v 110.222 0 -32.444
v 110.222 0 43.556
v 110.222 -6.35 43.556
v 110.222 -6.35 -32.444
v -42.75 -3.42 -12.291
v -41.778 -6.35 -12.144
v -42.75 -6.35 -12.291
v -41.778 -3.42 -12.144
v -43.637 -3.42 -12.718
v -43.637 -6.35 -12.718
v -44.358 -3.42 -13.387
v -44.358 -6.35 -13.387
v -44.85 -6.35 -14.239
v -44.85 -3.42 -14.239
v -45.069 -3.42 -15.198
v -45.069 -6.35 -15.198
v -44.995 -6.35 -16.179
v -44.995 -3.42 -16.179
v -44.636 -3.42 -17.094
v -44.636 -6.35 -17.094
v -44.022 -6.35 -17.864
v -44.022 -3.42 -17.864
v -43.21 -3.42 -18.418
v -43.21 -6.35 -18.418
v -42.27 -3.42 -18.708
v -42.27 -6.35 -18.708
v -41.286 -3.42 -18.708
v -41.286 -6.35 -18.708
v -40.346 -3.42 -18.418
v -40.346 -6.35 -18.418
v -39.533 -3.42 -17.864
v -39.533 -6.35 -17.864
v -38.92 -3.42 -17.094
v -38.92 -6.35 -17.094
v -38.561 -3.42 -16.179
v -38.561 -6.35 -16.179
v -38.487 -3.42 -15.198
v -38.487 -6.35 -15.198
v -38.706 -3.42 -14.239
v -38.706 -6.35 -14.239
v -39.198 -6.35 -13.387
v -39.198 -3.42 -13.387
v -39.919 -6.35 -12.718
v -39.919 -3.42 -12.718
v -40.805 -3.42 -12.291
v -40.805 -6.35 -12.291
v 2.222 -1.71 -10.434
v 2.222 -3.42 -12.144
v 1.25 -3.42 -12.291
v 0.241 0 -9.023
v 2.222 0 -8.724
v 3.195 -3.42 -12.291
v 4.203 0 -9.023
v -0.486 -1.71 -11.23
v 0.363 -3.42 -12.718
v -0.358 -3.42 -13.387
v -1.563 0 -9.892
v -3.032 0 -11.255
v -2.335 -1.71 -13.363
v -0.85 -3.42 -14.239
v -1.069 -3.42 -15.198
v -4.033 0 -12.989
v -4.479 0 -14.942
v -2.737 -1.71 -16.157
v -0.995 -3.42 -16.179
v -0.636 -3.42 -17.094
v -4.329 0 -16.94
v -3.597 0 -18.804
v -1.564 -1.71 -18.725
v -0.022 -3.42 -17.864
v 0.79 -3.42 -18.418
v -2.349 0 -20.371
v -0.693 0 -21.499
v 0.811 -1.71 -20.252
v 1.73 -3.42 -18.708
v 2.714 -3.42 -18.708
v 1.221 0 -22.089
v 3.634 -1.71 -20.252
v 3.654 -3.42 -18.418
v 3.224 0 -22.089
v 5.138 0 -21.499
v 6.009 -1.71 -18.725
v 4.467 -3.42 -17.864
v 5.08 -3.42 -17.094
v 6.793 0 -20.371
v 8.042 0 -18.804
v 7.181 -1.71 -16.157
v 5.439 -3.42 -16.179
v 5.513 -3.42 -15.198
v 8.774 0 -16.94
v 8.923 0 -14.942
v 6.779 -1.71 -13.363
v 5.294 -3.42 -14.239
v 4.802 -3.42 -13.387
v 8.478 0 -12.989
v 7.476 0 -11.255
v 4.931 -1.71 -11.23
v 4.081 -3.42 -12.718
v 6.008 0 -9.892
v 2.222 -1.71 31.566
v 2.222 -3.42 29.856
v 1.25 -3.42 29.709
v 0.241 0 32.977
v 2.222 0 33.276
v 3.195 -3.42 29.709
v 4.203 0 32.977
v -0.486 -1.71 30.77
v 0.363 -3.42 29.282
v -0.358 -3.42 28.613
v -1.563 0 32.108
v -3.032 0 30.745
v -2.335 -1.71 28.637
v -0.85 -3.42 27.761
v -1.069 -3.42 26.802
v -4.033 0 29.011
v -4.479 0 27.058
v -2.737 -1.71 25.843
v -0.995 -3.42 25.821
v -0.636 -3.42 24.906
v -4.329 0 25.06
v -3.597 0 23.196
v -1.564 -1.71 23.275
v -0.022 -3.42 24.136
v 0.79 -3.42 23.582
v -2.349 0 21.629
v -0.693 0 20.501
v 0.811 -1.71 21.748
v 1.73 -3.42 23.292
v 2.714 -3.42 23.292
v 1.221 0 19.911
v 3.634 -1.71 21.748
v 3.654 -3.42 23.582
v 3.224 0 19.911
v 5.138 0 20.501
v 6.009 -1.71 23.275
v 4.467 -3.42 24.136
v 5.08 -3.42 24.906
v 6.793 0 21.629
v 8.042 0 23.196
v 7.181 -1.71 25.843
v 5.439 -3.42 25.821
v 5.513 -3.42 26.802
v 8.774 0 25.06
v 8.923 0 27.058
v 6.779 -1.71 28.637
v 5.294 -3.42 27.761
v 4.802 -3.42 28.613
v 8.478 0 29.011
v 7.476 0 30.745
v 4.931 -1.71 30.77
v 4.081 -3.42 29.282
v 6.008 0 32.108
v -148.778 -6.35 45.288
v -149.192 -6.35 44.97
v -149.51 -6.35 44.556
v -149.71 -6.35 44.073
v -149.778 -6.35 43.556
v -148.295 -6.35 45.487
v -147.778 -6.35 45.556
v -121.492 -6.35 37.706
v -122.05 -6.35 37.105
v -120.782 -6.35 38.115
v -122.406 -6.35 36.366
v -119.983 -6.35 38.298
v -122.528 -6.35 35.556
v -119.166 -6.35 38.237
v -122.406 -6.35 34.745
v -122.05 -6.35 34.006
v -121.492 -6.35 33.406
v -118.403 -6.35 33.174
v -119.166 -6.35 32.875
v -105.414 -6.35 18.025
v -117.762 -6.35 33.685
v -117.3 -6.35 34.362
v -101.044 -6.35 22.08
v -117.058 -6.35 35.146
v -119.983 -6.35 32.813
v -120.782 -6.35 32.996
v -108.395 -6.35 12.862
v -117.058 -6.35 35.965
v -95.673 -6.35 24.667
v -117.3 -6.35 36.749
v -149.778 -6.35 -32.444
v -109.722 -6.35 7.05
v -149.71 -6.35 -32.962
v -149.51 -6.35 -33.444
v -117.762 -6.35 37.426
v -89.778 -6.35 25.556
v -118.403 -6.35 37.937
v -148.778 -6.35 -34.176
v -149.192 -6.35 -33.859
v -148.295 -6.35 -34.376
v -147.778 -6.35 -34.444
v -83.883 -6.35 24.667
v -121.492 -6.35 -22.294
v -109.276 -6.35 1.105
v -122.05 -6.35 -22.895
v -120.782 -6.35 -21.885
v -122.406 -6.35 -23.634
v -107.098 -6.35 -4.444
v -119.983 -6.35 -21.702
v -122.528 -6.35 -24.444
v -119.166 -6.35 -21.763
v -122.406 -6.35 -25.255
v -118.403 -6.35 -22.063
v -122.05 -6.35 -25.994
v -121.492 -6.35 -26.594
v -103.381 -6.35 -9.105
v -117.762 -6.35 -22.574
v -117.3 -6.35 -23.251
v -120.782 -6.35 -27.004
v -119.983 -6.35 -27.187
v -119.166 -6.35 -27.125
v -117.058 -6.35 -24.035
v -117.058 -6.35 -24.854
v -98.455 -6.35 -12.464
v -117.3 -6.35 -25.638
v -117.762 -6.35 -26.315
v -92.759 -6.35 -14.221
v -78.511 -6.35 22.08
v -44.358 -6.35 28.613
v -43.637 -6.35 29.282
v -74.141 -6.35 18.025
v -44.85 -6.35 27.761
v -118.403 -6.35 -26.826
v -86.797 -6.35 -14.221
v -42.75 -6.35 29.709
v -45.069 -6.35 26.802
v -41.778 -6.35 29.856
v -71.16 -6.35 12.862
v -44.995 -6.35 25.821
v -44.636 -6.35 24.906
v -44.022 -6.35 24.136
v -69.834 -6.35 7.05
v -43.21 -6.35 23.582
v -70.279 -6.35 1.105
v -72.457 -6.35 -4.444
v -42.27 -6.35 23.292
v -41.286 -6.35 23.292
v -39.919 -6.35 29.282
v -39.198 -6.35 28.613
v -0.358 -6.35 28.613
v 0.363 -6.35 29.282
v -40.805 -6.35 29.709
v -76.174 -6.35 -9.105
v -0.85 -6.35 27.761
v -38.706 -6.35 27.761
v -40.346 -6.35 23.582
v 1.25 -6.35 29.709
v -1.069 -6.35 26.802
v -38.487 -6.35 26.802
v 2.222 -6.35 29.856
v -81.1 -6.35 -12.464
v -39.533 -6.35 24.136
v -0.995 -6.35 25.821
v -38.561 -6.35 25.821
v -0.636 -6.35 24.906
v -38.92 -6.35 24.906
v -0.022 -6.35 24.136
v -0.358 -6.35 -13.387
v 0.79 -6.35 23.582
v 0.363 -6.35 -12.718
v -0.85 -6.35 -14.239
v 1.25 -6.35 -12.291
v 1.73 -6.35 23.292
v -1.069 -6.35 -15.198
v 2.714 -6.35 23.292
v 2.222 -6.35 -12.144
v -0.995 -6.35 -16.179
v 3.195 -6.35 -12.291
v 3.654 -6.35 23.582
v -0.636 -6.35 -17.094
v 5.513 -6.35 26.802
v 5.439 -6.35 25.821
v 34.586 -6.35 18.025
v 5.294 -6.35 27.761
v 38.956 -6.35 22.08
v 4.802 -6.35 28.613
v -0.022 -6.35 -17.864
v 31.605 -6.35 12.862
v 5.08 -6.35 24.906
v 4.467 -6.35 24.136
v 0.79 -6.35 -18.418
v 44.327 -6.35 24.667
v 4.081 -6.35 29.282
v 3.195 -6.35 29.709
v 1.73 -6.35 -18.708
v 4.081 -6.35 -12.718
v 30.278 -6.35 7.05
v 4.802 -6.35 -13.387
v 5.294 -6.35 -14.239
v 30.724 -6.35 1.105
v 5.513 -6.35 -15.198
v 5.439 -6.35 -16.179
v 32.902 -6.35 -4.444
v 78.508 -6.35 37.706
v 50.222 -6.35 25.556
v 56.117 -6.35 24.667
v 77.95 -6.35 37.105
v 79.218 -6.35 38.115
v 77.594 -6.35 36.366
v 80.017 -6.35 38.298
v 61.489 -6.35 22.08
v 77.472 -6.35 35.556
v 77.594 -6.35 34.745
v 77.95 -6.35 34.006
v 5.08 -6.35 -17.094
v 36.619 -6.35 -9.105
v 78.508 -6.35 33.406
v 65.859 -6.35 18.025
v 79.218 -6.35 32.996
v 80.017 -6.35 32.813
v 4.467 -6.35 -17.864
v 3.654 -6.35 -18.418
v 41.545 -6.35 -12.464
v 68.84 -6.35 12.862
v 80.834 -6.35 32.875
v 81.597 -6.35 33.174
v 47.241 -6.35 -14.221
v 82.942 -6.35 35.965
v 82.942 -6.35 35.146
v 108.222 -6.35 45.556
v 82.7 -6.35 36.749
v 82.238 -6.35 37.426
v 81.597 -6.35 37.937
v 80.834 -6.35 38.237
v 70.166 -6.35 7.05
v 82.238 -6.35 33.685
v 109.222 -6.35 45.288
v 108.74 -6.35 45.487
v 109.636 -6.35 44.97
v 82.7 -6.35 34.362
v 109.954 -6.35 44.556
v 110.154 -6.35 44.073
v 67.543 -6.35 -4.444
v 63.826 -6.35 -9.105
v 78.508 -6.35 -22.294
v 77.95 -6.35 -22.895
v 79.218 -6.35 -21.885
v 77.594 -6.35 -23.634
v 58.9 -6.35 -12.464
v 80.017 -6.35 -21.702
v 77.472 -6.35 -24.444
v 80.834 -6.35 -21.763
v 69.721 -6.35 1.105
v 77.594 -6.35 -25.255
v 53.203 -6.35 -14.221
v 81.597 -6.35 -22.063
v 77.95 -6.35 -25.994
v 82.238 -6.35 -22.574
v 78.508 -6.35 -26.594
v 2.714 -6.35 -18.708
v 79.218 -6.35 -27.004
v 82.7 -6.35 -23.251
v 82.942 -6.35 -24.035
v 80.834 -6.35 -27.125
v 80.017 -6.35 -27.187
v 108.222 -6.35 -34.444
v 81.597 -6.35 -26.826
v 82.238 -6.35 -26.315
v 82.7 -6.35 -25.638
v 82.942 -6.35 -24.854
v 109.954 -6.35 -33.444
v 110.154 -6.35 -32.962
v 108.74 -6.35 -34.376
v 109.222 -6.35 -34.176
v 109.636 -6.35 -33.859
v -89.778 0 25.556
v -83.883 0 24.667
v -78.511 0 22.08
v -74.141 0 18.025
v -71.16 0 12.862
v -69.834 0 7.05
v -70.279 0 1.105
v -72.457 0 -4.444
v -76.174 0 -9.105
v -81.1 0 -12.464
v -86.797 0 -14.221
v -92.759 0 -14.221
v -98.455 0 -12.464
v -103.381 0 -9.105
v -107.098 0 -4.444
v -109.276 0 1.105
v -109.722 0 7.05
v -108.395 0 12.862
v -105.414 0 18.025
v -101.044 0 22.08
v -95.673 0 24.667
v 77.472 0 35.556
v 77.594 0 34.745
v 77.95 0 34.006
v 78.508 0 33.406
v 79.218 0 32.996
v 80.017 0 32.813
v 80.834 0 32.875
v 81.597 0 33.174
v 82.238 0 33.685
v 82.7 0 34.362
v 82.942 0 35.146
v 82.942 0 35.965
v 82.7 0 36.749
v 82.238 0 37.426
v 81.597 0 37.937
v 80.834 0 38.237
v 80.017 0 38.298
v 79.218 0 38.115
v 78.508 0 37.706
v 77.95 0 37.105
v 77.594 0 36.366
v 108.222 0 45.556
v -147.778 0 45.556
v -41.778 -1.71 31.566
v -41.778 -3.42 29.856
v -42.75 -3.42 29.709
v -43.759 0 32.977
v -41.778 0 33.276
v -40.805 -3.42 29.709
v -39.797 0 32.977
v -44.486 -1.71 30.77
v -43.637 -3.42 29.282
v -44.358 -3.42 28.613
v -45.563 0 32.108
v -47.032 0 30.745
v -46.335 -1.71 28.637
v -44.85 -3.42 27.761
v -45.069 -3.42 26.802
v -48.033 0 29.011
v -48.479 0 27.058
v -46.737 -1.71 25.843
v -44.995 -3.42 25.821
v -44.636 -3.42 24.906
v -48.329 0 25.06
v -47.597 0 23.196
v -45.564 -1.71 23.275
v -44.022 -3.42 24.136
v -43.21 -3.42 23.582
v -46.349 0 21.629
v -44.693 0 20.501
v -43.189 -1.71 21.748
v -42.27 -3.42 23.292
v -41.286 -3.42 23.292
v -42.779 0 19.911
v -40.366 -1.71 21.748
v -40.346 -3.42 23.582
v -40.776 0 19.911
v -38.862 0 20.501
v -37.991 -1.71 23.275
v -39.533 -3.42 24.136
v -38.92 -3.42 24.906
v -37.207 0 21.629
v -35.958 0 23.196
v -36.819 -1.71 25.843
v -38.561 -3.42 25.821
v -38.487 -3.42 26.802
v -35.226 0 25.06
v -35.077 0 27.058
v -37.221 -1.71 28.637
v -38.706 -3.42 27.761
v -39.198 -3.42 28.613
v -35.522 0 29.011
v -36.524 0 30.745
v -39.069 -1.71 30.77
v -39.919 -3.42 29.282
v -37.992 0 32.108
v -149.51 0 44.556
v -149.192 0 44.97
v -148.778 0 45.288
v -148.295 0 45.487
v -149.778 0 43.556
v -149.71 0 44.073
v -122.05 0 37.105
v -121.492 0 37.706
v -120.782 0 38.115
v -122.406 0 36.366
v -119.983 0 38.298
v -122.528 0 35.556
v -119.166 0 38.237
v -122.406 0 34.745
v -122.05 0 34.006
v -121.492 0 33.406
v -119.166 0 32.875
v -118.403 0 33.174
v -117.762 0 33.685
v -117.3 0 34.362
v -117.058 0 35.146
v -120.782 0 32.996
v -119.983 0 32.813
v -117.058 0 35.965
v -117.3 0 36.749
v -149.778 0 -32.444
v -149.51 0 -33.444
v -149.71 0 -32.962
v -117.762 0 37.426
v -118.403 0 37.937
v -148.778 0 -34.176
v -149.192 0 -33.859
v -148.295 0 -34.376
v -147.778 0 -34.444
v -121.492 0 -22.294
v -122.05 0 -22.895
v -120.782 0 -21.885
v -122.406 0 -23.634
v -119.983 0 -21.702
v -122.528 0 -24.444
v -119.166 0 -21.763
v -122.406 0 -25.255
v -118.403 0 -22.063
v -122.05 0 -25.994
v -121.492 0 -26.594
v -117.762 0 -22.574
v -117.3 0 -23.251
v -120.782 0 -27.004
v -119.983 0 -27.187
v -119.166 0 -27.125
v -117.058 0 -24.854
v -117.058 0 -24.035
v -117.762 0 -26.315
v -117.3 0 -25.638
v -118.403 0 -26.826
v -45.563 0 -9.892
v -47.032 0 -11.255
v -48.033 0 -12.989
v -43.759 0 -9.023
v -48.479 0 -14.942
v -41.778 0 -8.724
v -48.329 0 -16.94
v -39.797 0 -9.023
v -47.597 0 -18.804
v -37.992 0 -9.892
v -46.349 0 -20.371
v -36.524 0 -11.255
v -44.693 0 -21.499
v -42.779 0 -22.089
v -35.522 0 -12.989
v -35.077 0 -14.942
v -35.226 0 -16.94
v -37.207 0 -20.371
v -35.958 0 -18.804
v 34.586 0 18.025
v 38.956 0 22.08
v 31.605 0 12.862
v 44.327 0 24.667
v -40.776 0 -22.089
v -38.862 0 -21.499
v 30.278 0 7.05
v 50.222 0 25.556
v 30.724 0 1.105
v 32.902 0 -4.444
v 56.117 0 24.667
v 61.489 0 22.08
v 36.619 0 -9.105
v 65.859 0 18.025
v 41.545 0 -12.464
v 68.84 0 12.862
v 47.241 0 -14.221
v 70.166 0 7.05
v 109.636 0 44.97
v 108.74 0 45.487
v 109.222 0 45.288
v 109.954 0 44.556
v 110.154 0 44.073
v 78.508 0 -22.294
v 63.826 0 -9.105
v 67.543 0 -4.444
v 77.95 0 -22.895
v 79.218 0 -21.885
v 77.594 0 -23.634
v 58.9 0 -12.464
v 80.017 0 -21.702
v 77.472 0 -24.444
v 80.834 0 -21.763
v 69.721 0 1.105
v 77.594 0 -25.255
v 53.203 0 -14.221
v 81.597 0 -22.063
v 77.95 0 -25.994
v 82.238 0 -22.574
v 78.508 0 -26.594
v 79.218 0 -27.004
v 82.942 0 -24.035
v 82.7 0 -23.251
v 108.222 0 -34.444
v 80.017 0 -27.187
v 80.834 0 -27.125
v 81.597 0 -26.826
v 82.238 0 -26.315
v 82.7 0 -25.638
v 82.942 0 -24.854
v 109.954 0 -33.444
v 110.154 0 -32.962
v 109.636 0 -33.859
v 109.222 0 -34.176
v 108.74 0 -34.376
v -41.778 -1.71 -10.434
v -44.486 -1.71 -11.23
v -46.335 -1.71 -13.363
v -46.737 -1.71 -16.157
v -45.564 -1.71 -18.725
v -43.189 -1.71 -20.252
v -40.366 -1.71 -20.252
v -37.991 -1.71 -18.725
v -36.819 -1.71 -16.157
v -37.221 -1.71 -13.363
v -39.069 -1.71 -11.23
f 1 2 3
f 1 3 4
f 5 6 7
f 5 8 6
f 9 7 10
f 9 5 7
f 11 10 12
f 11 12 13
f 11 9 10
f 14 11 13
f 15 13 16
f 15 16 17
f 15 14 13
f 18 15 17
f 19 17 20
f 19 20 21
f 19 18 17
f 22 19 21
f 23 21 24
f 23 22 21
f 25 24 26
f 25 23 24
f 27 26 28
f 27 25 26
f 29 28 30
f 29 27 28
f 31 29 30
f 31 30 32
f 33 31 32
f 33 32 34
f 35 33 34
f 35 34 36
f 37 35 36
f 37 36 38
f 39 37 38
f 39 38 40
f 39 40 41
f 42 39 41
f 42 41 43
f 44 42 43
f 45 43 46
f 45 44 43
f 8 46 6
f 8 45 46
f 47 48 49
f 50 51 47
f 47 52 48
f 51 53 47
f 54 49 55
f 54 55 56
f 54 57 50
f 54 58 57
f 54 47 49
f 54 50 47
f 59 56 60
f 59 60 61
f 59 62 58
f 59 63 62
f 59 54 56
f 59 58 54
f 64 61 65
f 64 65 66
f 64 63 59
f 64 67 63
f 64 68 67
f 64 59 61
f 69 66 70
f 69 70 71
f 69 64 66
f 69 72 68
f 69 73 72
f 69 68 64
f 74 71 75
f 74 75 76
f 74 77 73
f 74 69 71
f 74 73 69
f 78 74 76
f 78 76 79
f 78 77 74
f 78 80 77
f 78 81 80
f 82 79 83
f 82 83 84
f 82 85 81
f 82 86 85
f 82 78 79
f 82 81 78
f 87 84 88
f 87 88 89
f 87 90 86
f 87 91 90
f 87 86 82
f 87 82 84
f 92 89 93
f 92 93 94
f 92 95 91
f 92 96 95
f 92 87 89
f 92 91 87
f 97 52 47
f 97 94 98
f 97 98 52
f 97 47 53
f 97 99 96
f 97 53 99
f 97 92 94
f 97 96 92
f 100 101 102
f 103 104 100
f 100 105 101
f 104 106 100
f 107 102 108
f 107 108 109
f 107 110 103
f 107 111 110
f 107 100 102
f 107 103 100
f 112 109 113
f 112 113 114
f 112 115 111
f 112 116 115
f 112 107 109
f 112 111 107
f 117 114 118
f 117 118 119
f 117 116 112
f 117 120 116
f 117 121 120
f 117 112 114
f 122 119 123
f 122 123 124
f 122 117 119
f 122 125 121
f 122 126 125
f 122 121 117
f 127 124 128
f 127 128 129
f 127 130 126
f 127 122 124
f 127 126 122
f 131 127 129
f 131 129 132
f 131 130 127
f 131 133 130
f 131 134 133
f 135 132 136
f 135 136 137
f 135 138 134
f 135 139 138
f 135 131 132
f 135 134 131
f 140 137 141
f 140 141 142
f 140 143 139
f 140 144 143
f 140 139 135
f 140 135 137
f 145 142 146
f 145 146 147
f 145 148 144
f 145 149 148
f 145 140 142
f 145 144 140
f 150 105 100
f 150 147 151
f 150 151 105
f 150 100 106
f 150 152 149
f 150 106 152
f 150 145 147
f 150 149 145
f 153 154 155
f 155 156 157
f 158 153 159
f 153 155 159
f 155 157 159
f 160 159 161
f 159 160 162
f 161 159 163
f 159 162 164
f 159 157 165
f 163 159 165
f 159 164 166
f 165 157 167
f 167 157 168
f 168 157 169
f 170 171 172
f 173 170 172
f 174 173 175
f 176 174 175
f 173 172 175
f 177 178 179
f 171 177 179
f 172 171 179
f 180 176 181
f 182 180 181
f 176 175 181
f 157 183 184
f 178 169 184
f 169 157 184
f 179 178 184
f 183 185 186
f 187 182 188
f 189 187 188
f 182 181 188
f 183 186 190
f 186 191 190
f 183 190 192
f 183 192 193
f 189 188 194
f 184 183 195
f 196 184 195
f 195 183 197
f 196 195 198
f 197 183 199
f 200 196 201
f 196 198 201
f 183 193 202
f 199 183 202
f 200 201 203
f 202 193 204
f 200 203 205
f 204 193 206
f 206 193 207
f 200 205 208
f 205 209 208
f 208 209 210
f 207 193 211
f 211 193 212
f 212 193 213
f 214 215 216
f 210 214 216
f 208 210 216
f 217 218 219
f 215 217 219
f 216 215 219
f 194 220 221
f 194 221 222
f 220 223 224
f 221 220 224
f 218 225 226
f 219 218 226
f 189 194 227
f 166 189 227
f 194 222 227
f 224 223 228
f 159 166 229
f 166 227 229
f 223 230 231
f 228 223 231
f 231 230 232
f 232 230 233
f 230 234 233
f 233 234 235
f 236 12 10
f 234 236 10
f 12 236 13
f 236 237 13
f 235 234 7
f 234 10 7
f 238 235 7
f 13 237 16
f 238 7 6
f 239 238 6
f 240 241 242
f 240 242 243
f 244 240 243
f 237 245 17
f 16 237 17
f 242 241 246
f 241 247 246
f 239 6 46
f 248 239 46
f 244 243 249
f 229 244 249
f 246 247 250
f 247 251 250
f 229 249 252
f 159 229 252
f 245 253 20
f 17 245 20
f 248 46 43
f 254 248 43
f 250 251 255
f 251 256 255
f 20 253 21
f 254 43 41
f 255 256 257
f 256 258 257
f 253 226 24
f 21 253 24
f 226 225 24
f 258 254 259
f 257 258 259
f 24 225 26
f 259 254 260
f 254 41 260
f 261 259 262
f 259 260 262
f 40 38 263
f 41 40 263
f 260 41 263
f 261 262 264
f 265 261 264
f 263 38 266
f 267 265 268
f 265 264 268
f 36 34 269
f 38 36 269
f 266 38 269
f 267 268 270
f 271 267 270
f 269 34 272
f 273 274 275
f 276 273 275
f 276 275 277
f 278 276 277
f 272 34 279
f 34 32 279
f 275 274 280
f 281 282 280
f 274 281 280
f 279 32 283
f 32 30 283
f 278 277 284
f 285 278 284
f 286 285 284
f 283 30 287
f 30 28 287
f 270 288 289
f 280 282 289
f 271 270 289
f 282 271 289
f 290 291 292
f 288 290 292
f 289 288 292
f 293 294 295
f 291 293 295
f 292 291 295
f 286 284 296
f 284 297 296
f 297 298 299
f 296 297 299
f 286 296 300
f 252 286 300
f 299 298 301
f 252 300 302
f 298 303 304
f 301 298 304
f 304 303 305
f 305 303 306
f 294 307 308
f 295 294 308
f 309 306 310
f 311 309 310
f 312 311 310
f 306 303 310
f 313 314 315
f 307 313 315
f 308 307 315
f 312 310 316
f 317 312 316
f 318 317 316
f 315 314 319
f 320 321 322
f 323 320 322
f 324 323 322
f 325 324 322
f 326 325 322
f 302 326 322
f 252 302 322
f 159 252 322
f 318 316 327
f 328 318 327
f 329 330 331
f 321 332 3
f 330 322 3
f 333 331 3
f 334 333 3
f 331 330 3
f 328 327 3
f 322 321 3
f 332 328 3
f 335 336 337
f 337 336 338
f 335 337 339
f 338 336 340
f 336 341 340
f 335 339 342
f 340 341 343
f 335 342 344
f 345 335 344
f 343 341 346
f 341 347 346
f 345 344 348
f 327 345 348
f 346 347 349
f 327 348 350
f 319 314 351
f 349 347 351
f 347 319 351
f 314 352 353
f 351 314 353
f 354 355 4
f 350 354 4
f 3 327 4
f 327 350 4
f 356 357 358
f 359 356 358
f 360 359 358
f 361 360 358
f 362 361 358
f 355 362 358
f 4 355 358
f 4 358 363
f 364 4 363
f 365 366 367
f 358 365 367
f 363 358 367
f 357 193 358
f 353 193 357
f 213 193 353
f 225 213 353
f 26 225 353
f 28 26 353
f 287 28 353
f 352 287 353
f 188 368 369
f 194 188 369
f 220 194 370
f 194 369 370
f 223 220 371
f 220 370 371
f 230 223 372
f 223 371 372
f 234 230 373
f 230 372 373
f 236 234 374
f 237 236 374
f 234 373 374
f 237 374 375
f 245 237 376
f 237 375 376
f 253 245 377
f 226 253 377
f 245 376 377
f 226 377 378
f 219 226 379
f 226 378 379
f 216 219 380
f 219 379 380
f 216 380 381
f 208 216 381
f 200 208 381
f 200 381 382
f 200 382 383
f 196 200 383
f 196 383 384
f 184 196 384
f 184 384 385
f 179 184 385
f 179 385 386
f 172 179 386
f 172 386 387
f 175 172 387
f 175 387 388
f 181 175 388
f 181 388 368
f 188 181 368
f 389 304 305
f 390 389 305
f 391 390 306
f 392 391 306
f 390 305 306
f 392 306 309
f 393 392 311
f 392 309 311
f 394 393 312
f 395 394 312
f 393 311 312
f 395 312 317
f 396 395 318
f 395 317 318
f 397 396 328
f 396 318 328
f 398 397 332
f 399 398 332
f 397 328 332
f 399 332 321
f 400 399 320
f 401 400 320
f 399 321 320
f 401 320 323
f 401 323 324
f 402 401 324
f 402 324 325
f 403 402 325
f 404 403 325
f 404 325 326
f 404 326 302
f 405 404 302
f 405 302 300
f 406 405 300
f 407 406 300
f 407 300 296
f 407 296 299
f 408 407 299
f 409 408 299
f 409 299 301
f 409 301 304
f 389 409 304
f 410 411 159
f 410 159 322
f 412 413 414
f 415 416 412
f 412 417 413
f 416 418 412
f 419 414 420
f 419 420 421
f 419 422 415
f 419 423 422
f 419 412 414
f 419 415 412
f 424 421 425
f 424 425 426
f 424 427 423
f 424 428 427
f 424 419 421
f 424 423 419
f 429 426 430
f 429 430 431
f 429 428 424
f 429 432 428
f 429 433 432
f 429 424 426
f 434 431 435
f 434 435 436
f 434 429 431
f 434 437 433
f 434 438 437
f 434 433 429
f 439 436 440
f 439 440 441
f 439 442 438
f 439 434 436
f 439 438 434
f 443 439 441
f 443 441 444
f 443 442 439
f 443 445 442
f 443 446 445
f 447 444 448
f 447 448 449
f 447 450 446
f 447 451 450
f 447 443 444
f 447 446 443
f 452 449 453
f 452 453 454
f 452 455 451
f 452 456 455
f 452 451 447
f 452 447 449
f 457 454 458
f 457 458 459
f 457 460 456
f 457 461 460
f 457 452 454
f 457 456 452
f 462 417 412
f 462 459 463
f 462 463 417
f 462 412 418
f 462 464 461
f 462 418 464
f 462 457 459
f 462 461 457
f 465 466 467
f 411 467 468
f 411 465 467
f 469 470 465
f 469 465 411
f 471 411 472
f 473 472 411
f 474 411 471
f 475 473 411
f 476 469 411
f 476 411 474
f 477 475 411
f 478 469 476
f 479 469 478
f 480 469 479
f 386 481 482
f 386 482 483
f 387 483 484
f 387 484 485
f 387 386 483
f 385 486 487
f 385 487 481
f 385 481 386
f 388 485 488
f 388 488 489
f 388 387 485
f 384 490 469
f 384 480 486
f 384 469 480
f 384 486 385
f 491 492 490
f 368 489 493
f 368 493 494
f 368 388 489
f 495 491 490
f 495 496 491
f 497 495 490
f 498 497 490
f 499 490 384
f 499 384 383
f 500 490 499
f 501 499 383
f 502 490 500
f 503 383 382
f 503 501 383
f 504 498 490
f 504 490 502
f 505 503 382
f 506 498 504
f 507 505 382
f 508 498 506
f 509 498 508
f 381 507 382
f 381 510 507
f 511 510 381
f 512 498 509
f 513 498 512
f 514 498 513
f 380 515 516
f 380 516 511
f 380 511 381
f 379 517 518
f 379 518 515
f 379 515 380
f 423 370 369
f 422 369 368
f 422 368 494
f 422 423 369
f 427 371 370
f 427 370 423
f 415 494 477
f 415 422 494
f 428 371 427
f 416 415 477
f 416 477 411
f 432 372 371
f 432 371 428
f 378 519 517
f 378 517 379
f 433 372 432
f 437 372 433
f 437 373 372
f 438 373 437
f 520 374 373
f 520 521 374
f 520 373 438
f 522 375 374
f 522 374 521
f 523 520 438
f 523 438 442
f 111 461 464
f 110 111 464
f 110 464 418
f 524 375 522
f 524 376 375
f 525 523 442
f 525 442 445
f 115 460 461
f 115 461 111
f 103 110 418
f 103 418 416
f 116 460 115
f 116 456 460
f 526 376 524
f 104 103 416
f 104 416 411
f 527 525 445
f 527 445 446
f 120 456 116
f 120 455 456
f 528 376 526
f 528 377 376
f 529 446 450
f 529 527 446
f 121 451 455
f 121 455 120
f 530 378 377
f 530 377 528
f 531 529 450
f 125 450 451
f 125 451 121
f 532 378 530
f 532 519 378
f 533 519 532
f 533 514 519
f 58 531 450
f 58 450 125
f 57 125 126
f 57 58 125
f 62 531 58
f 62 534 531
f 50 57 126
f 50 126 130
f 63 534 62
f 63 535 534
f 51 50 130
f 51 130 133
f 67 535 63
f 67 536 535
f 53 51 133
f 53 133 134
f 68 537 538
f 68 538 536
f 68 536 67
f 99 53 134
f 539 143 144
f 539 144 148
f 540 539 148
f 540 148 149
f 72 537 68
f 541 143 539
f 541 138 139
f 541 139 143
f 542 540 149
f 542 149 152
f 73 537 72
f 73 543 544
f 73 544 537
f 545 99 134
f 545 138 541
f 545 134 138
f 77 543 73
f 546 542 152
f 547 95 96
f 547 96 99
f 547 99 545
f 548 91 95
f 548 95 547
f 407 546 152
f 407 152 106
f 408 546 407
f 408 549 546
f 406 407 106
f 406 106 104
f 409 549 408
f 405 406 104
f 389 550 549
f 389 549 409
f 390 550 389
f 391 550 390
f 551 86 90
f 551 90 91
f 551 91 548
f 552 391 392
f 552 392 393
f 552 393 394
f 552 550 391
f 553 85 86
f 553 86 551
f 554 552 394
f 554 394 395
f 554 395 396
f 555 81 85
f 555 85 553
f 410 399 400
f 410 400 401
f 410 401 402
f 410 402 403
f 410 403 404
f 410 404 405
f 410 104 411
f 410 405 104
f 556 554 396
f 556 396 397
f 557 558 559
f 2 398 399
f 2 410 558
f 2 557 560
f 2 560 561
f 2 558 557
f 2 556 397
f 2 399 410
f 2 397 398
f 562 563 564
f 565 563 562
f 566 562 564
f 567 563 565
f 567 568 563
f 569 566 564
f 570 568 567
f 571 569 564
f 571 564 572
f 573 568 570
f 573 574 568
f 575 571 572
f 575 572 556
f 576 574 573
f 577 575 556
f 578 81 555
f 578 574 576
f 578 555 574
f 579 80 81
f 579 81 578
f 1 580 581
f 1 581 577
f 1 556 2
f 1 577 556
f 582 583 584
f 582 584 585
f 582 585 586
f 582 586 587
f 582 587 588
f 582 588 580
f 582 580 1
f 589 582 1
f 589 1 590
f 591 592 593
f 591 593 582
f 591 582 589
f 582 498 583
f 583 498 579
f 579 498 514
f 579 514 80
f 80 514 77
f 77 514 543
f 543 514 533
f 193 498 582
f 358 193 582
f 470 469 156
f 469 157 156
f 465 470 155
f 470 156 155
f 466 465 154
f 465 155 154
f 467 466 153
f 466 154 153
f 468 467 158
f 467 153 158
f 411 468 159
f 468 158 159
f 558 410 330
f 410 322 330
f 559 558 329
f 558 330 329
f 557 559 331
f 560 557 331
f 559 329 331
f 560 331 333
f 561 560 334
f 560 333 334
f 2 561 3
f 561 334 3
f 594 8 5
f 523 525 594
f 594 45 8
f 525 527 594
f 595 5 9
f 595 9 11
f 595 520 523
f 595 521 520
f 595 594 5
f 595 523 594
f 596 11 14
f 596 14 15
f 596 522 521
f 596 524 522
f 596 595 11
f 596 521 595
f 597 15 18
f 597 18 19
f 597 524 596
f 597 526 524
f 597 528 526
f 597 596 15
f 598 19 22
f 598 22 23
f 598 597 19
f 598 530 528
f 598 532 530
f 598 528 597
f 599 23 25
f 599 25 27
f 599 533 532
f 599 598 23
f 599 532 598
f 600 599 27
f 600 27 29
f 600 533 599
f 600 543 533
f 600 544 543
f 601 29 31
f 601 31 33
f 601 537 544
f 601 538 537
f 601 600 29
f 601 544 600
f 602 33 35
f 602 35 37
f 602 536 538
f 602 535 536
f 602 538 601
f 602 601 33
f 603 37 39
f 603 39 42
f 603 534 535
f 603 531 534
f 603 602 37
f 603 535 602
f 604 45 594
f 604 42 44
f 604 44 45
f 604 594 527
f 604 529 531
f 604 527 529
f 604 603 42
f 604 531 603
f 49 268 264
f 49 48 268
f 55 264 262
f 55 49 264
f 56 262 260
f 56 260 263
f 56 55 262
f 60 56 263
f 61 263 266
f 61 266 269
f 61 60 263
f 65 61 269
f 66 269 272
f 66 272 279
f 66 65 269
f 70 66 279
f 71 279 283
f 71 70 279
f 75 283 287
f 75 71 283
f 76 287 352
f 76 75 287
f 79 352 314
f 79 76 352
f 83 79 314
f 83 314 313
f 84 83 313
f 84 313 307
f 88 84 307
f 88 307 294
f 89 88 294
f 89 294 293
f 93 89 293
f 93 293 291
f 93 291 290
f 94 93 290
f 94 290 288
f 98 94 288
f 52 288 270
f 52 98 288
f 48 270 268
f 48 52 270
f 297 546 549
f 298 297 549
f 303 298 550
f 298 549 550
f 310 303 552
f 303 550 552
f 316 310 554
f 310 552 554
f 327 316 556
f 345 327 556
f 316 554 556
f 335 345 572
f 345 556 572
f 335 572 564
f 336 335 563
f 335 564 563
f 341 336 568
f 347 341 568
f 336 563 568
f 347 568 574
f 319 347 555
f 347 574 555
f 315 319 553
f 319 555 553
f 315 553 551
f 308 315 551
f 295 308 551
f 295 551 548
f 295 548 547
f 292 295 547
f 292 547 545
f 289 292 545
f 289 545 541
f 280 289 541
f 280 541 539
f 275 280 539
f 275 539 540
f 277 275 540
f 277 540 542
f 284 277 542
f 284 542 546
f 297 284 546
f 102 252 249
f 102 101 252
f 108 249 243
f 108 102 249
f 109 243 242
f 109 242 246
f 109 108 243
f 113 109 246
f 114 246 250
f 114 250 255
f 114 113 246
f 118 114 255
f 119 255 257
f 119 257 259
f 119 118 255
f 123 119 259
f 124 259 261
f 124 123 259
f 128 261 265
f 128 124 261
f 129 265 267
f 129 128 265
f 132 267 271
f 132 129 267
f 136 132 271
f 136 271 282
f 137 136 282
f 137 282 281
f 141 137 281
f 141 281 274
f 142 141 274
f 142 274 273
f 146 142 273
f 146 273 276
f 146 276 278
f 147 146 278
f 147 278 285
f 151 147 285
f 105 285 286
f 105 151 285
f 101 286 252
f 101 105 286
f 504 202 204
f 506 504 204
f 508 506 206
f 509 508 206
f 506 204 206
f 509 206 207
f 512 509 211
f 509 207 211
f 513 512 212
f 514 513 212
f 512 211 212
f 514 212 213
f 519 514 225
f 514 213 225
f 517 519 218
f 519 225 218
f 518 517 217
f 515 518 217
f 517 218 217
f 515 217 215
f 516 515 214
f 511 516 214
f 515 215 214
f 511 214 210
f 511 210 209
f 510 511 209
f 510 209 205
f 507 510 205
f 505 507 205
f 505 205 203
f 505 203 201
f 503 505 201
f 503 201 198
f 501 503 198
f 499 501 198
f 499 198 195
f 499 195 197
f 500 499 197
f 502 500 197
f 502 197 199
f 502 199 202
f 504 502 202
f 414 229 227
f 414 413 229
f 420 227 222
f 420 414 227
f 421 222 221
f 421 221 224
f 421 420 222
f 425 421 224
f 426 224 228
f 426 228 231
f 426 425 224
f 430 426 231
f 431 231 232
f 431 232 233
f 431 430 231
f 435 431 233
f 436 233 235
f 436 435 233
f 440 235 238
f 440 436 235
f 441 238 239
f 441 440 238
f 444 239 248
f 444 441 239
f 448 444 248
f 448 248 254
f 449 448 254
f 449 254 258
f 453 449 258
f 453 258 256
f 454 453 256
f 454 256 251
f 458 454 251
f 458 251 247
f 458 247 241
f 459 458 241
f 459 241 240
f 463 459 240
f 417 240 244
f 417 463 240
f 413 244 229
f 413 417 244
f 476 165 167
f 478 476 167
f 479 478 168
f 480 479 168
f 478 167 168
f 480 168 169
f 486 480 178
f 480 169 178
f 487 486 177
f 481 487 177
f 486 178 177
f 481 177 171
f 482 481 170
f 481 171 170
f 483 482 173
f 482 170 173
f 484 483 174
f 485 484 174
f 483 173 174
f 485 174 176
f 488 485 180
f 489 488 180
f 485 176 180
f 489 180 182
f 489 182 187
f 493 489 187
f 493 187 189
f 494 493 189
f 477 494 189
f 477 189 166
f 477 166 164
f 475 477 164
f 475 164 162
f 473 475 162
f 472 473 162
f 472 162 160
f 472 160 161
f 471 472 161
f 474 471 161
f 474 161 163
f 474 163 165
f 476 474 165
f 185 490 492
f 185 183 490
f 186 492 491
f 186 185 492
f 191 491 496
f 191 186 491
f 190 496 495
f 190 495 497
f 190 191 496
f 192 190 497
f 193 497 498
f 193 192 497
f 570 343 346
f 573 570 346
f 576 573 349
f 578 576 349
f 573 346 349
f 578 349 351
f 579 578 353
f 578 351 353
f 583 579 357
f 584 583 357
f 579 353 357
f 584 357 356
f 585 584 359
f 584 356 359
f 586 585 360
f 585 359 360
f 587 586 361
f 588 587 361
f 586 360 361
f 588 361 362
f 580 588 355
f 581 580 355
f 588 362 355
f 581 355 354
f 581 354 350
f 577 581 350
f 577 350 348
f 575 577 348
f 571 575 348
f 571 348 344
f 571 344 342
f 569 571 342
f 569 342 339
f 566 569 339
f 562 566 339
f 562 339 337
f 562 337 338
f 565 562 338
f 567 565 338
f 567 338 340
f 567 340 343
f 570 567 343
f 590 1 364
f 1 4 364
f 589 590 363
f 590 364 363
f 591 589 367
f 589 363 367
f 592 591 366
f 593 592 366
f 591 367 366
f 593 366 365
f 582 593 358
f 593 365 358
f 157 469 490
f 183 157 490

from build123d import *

# Parameters (mm, degrees)
CROQUIS1_W                                   = 260
CROQUIS1_H                                   = 80
BRIDA_BASE1_DEPTH                            = 6.35
REDONDEO1_R                                  = 2
TALADRO_DE_MARGEN_PARA_M51_D                 = 5.5
REFRENTADO_PARA_TORNILLO_TAP_N_CON_C_2_COUNT = 2
REFRENTADO_PARA_TORNILLO_TAP_N_CON_C_2_PITCH = 44
REFRENTADO_PARA_TORNILLO_TAP_N_CON_C_3_COUNT = 2
REFRENTADO_PARA_TORNILLO_TAP_N_CON_C_3_PITCH = 60.827625303
REFRENTADO_PARA_TORNILLO_TAP_N_CON_C_4_COUNT = 2
REFRENTADO_PARA_TORNILLO_TAP_N_CON_C_4_PITCH = 42
CROQUIS11_R                                  = 20
CORTAR_EXTRUIR1_DEPTH                        = 10


# Sheet-metal steps are written as plain solids
with BuildPart() as part:
    # Croquis1 → Brida base1 (new body)
    with BuildSketch(Plane(origin=(0, 0, 0), x_dir=(1, 0, 0), z_dir=(0, 1, 0))):
        with Locations((-19.777777778, -5.555555556)):
            Rectangle(CROQUIS1_W, CROQUIS1_H)
    extrude(amount=-BRIDA_BASE1_DEPTH)

    # Redondeo1
    redondeo1_edges = [part.edges().sort_by_distance(p)[0] for p in [
        (-149.777777778, -3.175, -34.444444444),
        (110.222222222, -3.175, -34.444444444),
        (110.222222222, -3.175, 45.555555556),
        (-149.777777778, -3.175, 45.555555556),
    ]]
    fillet(redondeo1_edges, radius=REDONDEO1_R)

    # Taladro de margen para M51 (through all)
    with Locations(Plane(origin=(0, 0, 0), x_dir=(1, 0, 0), z_dir=(0, 1, 0))):
        with Locations((-119.777777778, 24.444444444), (-119.777777778, -35.555555556), (80.222222222, -35.555555556), (80.222222222, 24.444444444)):
            Hole(TALADRO_DE_MARGEN_PARA_M51_D / 2)

    # Croquis9 → Refrentado para tornillo tapón con cabeza plana de clavija de M61 (revolve, cut)
    with BuildSketch(Plane(origin=(-41.777777778, 0, -15.444444444), x_dir=(0, 0, 1), z_dir=(1, 0, 0))):
        Polygon((0, 0), (0, 6.35), (3.3, 6.35), (3.3, 3.42), (6.72, 0), align=None)
    refrentado_para_tornillo_tap_n_con_cabez = revolve(axis=Axis((-41.777777778, 6.35, -15.444444444), (0, -1, 0)), mode=Mode.SUBTRACT)

    # Refrentado para tornillo tap_n con c 2: Refrentado para tornillo tapón con cabeza plana de clavija de M61 ×2
    with Locations(*[(i * REFRENTADO_PARA_TORNILLO_TAP_N_CON_C_2_PITCH, 0, 0) for i in range(1, REFRENTADO_PARA_TORNILLO_TAP_N_CON_C_2_COUNT)]):
        add(refrentado_para_tornillo_tap_n_con_cabez, mode=Mode.SUBTRACT)

    # Refrentado para tornillo tap_n con c 3: Refrentado para tornillo tapón con cabeza plana de clavija de M61 ×2
    with Locations(*[Vector(0.7233555441435721, 0, 0.6904757466825007) * (i * REFRENTADO_PARA_TORNILLO_TAP_N_CON_C_3_PITCH) for i in range(1, REFRENTADO_PARA_TORNILLO_TAP_N_CON_C_3_COUNT)]):
        add(refrentado_para_tornillo_tap_n_con_cabez, mode=Mode.SUBTRACT)

    # Refrentado para tornillo tap_n con c 4: Refrentado para tornillo tapón con cabeza plana de clavija de M61 ×2
    with Locations(*[(0, 0, i * REFRENTADO_PARA_TORNILLO_TAP_N_CON_C_4_PITCH) for i in range(1, REFRENTADO_PARA_TORNILLO_TAP_N_CON_C_4_COUNT)]):
        add(refrentado_para_tornillo_tap_n_con_cabez, mode=Mode.SUBTRACT)

    # Croquis11 → Cortar-Extruir1 (cut)
    with BuildSketch(Plane(origin=(0, 0, 0), x_dir=(1, 0, 0), z_dir=(0, 1, 0))):
        with Locations(Location((-89.777777778, -5.555555556, 0), (0, 0, 270))):
            Circle(CROQUIS11_R)
        with Locations(Location((50.222222222, -5.555555556, 0), (0, 0, 270))):
            Circle(CROQUIS11_R)
    extrude(amount=-CORTAR_EXTRUIR1_DEPTH, mode=Mode.SUBTRACT)


solid = part.part
